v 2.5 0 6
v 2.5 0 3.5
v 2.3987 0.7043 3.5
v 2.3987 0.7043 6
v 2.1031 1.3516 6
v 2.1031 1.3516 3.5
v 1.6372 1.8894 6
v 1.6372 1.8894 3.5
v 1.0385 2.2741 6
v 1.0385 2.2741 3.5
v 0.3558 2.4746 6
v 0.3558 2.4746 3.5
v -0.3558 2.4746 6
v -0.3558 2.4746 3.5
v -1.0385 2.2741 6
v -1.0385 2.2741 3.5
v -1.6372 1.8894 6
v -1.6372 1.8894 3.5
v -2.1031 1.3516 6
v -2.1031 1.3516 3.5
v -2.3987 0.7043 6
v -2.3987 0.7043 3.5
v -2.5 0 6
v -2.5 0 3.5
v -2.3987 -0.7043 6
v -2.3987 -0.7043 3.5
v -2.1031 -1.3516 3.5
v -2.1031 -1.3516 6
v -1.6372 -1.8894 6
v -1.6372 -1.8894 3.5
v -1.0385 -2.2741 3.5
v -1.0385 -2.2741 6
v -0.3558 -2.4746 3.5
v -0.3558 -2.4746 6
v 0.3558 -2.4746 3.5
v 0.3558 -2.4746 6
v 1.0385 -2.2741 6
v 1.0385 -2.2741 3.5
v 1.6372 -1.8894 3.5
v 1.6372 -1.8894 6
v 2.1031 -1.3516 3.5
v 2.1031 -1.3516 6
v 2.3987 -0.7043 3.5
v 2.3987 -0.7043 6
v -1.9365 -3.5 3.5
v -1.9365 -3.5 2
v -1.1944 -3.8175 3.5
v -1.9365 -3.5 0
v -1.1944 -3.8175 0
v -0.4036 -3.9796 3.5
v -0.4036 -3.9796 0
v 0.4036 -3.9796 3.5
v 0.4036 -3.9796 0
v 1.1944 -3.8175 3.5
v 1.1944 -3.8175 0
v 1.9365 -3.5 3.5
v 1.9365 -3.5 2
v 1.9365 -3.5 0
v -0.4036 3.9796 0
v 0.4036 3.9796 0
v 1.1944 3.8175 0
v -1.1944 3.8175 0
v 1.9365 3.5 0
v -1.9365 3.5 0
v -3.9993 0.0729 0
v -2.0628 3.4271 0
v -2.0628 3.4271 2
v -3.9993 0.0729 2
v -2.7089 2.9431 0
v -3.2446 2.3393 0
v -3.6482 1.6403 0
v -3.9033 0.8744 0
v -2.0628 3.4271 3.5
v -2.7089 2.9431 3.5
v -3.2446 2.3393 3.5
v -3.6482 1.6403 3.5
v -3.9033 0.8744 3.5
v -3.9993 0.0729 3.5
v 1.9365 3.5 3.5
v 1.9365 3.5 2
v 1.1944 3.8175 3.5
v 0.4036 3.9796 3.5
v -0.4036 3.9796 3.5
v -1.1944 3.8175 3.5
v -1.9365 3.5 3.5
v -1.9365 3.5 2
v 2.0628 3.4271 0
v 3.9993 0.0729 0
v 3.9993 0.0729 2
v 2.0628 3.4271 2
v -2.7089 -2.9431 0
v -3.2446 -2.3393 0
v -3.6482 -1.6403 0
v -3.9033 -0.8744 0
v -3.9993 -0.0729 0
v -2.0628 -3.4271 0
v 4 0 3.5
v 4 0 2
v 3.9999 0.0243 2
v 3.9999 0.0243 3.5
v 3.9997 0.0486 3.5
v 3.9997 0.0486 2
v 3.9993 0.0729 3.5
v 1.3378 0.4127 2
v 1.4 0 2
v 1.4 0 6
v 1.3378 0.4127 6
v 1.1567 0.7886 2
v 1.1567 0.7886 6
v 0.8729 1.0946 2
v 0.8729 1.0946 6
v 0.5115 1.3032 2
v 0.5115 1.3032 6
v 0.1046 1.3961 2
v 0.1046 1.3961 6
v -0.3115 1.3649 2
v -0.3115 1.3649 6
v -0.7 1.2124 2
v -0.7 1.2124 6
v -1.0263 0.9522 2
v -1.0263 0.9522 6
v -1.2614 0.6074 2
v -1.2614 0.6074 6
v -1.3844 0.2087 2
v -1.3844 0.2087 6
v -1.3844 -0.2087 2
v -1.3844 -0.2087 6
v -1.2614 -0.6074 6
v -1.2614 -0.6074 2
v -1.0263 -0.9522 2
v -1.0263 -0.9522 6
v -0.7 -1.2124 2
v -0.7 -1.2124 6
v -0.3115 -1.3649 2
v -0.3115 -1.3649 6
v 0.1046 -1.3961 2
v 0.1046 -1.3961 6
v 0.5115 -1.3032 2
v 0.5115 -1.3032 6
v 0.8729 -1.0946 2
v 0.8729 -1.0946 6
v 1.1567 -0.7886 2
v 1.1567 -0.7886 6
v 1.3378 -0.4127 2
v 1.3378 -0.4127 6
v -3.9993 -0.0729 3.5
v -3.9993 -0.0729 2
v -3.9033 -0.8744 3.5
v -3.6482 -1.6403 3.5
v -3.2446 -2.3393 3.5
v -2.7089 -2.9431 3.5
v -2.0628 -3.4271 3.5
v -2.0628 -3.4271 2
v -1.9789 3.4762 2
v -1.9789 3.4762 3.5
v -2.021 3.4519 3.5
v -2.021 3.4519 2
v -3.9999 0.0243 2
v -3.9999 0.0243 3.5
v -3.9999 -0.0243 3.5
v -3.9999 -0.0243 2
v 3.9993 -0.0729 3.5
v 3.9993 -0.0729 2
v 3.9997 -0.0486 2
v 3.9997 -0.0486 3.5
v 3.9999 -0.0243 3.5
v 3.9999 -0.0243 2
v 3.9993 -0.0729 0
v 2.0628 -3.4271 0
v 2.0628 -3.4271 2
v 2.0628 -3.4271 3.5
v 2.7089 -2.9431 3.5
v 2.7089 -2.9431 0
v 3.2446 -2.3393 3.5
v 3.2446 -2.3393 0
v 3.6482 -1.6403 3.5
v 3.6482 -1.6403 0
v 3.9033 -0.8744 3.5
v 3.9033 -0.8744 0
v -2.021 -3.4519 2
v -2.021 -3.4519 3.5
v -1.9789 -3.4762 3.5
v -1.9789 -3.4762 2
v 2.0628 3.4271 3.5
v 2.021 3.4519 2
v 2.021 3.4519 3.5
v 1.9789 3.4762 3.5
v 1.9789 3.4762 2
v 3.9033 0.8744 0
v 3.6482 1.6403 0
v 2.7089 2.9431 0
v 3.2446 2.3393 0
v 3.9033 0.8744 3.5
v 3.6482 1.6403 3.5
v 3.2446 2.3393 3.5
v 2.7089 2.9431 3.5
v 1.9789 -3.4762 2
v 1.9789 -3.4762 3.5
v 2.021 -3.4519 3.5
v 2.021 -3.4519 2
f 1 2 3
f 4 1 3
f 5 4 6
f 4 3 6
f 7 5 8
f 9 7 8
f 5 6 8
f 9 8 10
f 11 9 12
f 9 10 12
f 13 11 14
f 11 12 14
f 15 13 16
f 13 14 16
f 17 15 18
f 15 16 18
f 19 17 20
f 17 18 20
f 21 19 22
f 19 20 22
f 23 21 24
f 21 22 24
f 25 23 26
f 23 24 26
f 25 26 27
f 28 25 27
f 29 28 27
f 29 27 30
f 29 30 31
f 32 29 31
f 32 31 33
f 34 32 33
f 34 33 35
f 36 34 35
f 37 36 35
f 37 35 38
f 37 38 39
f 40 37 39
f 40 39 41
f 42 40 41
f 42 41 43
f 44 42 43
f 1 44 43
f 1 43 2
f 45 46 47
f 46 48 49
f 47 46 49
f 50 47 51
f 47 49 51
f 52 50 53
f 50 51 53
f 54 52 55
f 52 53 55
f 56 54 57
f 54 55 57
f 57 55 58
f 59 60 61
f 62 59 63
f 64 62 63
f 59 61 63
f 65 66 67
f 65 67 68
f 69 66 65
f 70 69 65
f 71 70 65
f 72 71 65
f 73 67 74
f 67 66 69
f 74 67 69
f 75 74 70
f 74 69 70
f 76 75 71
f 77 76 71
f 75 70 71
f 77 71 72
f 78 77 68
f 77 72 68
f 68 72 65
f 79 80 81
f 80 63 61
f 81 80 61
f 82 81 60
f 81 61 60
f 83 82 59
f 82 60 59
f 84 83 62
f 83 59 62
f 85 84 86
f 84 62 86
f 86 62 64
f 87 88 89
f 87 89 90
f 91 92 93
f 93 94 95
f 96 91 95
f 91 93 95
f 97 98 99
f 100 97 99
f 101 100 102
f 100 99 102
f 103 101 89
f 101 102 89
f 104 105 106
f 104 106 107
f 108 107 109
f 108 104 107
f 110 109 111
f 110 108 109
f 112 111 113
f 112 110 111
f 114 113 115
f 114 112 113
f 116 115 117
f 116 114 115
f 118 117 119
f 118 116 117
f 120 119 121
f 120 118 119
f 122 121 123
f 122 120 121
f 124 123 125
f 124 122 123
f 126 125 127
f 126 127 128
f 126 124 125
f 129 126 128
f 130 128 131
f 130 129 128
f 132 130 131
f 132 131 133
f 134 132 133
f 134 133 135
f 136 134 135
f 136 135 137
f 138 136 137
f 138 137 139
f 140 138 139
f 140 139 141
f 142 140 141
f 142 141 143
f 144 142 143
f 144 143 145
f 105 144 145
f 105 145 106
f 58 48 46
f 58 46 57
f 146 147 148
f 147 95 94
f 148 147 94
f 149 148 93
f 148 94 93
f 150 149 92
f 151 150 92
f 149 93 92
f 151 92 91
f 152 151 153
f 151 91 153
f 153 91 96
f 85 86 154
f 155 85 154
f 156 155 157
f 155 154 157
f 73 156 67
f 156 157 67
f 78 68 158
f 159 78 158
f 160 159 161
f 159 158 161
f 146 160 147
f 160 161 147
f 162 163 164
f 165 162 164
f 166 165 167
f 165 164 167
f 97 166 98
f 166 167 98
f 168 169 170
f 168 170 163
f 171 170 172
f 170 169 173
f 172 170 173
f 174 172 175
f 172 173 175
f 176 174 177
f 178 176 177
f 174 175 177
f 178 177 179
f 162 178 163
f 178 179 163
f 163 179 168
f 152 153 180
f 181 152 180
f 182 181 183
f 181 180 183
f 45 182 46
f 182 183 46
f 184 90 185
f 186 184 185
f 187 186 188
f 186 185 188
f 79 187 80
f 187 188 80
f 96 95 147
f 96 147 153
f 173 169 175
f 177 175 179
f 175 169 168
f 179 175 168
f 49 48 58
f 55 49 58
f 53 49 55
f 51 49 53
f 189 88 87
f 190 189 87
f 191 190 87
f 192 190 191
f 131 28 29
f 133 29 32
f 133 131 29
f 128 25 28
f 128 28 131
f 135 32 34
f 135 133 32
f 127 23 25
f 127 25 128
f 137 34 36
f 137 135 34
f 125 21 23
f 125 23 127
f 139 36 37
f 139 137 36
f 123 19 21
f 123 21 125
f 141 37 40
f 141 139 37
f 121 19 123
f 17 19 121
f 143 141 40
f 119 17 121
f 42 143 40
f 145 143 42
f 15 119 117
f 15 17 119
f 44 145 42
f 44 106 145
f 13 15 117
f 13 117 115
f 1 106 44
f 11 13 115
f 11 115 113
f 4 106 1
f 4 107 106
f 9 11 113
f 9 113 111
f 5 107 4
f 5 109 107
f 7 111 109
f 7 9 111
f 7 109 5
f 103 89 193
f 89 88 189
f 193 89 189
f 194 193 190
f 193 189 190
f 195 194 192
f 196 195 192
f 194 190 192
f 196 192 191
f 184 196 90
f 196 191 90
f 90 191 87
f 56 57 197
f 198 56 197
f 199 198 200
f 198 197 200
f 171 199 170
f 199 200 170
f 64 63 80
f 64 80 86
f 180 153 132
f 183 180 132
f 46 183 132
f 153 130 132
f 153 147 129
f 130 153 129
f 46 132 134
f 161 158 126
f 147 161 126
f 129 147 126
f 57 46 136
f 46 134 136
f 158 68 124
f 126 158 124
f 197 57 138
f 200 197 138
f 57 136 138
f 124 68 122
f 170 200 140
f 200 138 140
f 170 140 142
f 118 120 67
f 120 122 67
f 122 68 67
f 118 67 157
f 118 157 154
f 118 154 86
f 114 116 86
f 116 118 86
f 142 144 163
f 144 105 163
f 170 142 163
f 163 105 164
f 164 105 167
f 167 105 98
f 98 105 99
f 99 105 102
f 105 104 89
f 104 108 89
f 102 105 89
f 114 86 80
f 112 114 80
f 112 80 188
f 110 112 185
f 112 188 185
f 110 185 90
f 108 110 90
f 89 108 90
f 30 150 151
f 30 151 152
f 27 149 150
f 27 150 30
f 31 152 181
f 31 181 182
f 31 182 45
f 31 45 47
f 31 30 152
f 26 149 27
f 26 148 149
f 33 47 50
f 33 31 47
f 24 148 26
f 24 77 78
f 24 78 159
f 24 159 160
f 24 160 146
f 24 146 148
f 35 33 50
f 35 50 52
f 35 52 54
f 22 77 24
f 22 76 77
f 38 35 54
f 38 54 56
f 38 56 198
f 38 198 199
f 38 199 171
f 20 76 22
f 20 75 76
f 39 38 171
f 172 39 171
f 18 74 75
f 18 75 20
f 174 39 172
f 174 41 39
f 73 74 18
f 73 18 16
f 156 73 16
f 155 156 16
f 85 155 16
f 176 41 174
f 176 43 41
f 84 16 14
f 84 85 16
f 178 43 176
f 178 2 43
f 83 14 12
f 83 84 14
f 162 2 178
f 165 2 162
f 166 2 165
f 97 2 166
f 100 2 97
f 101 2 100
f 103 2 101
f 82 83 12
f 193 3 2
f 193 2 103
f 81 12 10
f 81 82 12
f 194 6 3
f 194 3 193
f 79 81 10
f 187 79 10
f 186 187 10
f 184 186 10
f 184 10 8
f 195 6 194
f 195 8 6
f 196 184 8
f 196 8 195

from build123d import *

# Parameters (mm, degrees)
F0_R     = 2.5
F0_R_2   = 1.4
F1_DEPTH = 6
F2_DEPTH = 3.5
F3_DEPTH = 2


with BuildPart() as f1:
    # F0 (on Top) → F1 (new body)
    with BuildSketch(Plane.XY):
        Circle(F0_R)
        Circle(F0_R_2, mode=Mode.SUBTRACT)
    extrude(amount=F1_DEPTH)

    # F0 (on Top) → F2 (join)
    with BuildSketch(Plane.XY):
        with BuildLine():
            ThreePointArc((3.9993347498, -0.0729490169), (3.999833684, -0.0364760251), (4, 0))
            ThreePointArc((4, 0), (3.999833684, 0.0364760251), (3.9993347498, 0.0729490169))
            Line((3.9993347498, 0.0729490169), (2.0628430767, 3.4270509831))
            ThreePointArc((2.0628430767, 3.4270509831), (2, 3.4641016151), (1.9364916731, 3.5))
            Line((1.9364916731, 3.5), (-1.9364916731, 3.5))
            ThreePointArc((-1.9364916731, 3.5), (-2, 3.4641016151), (-2.0628430767, 3.4270509831))
            Line((-2.0628430767, 3.4270509831), (-3.9993347498, 0.0729490169))
            ThreePointArc((-3.9993347498, 0.0729490169), (-4, 0), (-3.9993347498, -0.0729490169))
            Line((-3.9993347498, -0.0729490169), (-2.0628430767, -3.4270509831))
            ThreePointArc((-2.0628430767, -3.4270509831), (-2, -3.4641016151), (-1.9364916731, -3.5))
            Line((-1.9364916731, -3.5), (1.9364916731, -3.5))
            ThreePointArc((1.9364916731, -3.5), (2, -3.4641016151), (2.0628430767, -3.4270509831))
            Line((2.0628430767, -3.4270509831), (3.9993347498, -0.0729490169))
        make_face()
        Circle(F0_R, mode=Mode.SUBTRACT)
        with BuildLine():
            Line((-1.9364916731, 3.5), (1.9364916731, 3.5))
            ThreePointArc((1.9364916731, 3.5), (0, 4), (-1.9364916731, 3.5))
        make_face()
        with BuildLine():
            Line((-3.9993347498, 0.0729490169), (-2.0628430767, 3.4270509831))
            ThreePointArc((-2.0628430767, 3.4270509831), (-3.4641016151, 2), (-3.9993347498, 0.0729490169))
        make_face()
        with BuildLine():
            ThreePointArc((-3.9993347498, -0.0729490169), (-3.4641016151, -2), (-2.0628430767, -3.4270509831))
            Line((-2.0628430767, -3.4270509831), (-3.9993347498, -0.0729490169))
        make_face()
        with BuildLine():
            ThreePointArc((-1.9364916731, -3.5), (0, -4), (1.9364916731, -3.5))
            Line((1.9364916731, -3.5), (-1.9364916731, -3.5))
        make_face()
        with BuildLine():
            ThreePointArc((2.0628430767, -3.4270509831), (3.4641016151, -2), (3.9993347498, -0.0729490169))
            Line((3.9993347498, -0.0729490169), (2.0628430767, -3.4270509831))
        make_face()
        with BuildLine():
            Line((2.0628430767, 3.4270509831), (3.9993347498, 0.0729490169))
            ThreePointArc((3.9993347498, 0.0729490169), (3.4641016151, 2), (2.0628430767, 3.4270509831))
        make_face()
    extrude(amount=F2_DEPTH)

    # F0 (on Top) → F3 (cut)
    with BuildSketch(Plane.XY):
        with BuildLine():
            ThreePointArc((3.9993347498, -0.0729490169), (3.999833684, -0.0364760251), (4, 0))
            ThreePointArc((4, 0), (3.999833684, 0.0364760251), (3.9993347498, 0.0729490169))
            Line((3.9993347498, 0.0729490169), (2.0628430767, 3.4270509831))
            ThreePointArc((2.0628430767, 3.4270509831), (2, 3.4641016151), (1.9364916731, 3.5))
            Line((1.9364916731, 3.5), (-1.9364916731, 3.5))
            ThreePointArc((-1.9364916731, 3.5), (-2, 3.4641016151), (-2.0628430767, 3.4270509831))
            Line((-2.0628430767, 3.4270509831), (-3.9993347498, 0.0729490169))
            ThreePointArc((-3.9993347498, 0.0729490169), (-4, 0), (-3.9993347498, -0.0729490169))
            Line((-3.9993347498, -0.0729490169), (-2.0628430767, -3.4270509831))
            ThreePointArc((-2.0628430767, -3.4270509831), (-2, -3.4641016151), (-1.9364916731, -3.5))
            Line((-1.9364916731, -3.5), (1.9364916731, -3.5))
            ThreePointArc((1.9364916731, -3.5), (2, -3.4641016151), (2.0628430767, -3.4270509831))
            Line((2.0628430767, -3.4270509831), (3.9993347498, -0.0729490169))
        make_face()
        Circle(F0_R, mode=Mode.SUBTRACT)
        Circle(F0_R)
        Circle(F0_R_2, mode=Mode.SUBTRACT)
    extrude(amount=F3_DEPTH, mode=Mode.SUBTRACT)


solid = f1.part
